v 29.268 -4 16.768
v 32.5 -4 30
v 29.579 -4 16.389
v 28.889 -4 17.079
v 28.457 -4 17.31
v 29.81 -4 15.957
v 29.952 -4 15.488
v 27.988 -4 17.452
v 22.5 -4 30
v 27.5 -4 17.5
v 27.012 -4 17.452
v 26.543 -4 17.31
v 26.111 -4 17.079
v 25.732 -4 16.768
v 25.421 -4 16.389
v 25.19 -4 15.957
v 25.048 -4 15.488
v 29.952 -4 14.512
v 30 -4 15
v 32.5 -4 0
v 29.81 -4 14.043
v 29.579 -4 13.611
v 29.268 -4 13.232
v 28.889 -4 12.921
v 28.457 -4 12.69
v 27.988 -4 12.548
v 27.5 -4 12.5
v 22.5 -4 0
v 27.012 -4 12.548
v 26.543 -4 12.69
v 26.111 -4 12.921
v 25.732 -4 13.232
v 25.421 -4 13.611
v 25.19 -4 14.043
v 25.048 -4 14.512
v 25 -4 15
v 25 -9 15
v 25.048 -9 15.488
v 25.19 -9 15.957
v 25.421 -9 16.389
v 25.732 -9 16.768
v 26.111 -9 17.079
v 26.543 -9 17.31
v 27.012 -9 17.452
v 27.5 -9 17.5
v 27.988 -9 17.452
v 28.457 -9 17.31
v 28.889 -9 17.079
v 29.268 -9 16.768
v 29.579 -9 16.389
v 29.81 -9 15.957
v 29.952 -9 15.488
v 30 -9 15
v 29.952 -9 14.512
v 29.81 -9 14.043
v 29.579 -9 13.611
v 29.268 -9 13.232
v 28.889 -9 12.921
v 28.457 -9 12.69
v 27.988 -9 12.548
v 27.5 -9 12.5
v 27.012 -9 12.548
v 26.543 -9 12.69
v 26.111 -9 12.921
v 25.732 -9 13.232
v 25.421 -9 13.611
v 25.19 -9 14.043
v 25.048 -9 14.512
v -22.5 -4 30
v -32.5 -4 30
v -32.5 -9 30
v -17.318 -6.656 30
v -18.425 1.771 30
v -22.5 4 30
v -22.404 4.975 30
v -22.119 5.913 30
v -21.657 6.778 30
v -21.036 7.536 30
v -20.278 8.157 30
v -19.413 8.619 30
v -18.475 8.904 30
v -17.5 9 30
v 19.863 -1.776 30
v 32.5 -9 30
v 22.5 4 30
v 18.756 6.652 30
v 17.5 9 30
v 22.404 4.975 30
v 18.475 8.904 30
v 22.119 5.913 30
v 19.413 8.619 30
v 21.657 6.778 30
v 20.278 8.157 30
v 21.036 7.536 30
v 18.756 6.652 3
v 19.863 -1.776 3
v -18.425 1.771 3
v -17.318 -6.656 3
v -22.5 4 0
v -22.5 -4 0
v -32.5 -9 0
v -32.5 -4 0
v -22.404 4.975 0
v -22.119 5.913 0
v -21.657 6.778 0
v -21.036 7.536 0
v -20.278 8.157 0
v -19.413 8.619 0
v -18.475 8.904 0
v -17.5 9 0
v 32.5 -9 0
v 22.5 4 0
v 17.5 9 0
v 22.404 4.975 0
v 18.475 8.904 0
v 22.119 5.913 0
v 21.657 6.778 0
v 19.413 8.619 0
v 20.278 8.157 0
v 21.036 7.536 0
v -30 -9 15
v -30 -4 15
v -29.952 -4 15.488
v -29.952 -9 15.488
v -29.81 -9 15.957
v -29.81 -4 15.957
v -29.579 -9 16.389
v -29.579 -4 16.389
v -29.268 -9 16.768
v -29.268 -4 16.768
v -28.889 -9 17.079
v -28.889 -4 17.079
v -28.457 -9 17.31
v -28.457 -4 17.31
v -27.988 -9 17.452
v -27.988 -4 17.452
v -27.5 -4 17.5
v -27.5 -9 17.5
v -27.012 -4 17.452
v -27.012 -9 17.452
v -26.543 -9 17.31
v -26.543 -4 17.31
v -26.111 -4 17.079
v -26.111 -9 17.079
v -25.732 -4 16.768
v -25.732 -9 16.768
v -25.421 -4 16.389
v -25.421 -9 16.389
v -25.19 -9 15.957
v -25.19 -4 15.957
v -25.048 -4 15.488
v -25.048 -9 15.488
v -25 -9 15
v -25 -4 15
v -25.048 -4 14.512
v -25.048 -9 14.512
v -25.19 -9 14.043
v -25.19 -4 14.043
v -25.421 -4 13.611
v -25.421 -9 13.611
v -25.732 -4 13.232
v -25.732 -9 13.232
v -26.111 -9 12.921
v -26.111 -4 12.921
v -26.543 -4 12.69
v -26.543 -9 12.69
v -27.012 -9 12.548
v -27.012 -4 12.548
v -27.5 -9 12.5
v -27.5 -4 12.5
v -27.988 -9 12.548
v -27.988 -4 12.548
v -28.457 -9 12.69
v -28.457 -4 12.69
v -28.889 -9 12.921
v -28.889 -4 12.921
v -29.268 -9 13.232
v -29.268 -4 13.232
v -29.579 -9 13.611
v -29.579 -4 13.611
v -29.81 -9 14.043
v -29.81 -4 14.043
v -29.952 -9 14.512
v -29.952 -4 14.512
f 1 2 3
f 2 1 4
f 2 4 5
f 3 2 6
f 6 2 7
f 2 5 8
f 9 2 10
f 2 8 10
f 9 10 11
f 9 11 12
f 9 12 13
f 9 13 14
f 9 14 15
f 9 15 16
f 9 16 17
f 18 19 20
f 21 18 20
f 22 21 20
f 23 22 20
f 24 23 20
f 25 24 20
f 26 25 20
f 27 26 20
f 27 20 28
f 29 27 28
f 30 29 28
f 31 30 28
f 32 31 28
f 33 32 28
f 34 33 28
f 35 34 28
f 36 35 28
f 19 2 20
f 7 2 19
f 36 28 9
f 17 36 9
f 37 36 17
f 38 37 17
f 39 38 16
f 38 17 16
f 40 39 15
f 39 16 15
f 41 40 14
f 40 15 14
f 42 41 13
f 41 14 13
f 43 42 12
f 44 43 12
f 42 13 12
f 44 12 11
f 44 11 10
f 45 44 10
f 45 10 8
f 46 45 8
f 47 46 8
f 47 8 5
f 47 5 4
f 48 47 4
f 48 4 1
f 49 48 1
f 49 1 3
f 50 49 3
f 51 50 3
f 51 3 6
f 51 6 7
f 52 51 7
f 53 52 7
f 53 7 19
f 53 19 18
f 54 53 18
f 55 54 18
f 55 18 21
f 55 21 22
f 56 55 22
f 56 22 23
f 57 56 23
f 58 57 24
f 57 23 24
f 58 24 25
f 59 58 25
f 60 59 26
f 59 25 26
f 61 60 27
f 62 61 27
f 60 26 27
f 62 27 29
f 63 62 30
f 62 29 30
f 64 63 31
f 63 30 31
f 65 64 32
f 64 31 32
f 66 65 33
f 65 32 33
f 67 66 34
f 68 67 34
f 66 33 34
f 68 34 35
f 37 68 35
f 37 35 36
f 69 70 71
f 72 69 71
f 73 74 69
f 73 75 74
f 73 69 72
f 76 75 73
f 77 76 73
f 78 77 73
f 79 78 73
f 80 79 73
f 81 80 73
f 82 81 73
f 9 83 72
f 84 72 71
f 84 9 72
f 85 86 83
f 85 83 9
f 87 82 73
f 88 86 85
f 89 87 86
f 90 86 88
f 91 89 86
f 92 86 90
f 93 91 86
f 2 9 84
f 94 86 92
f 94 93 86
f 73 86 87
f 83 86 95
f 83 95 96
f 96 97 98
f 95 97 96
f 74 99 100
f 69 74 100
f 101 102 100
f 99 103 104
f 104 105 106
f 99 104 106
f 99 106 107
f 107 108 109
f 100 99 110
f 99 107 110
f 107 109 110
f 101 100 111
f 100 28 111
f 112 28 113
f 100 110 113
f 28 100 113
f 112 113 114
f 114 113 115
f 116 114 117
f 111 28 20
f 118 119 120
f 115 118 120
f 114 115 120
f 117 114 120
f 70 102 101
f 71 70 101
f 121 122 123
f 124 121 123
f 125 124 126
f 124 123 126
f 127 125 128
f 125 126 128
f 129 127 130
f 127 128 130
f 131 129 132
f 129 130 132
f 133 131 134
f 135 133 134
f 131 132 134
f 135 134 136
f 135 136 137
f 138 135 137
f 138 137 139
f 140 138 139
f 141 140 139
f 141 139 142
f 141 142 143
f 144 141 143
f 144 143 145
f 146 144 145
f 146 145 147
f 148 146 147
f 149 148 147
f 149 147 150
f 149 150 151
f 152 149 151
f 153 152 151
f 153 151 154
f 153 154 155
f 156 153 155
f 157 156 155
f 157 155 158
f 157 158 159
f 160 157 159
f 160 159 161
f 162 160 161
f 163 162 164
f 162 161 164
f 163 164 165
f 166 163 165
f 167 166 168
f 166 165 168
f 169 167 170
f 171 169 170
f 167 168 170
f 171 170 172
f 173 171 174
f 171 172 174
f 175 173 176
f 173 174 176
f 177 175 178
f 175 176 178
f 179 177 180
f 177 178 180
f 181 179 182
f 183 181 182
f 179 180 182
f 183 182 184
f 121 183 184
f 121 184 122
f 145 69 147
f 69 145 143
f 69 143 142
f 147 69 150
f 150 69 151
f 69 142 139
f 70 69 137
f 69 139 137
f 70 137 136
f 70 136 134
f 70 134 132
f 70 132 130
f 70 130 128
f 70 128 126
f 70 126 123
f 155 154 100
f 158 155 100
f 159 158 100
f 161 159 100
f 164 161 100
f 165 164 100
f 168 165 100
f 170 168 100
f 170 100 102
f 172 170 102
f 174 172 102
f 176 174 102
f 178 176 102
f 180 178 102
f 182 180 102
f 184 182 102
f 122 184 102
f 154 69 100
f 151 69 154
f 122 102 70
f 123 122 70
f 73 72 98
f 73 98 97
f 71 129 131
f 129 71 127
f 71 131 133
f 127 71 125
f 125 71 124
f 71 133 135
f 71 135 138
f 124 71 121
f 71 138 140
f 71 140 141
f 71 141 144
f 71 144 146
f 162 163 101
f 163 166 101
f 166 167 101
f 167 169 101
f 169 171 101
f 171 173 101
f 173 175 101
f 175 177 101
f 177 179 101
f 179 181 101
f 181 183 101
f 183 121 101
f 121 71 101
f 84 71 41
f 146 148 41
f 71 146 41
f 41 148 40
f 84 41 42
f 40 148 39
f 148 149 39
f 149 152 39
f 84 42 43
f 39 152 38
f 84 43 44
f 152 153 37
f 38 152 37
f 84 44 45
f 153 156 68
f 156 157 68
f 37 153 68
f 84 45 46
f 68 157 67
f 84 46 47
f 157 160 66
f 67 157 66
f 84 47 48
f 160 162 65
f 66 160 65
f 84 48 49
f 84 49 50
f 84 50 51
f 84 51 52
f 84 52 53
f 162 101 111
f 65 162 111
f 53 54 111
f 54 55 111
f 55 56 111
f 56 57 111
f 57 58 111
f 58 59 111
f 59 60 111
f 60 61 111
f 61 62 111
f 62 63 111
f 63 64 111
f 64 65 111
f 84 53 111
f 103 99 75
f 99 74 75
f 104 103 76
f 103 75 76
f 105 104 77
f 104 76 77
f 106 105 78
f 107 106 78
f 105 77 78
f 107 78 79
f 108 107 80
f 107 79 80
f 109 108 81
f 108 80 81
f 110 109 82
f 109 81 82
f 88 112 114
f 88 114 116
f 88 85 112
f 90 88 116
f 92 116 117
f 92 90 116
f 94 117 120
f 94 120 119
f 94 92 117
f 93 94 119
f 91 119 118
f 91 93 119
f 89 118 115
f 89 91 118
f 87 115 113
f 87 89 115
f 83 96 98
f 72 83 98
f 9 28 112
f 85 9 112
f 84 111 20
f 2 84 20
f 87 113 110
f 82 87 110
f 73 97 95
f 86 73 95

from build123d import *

# Parameters (mm, degrees)
F1_DEPTH = 30
F2_DEPTH = 3
F3_R     = 5
F5_R     = 2.5
F4_R     = 2.5
F6_DEPTH = 25


with BuildPart() as f1:
    # F0 (on Top) → F1 (new body)
    with BuildSketch(Plane.XY):
        Polygon((-32.5, -9), (32.5, -9), (32.5, -4), (22.5, -4), (22.5, 9), (-22.5, 9), (-22.5, -4), (-32.5, -4), align=None)
        Polygon((18.7564, 6.652187), (19.862741, -1.775506), (-17.318257, -6.656426), (-18.424599, 1.771267), align=None, mode=Mode.SUBTRACT)
    extrude(amount=F1_DEPTH)

    # F0 (on Top) → F2 (join)
    with BuildSketch(Plane.XY):
        Polygon((-17.318257, -6.656426), (19.862741, -1.775506), (18.7564, 6.652187), (-18.424599, 1.771267), align=None)
    extrude(amount=F2_DEPTH)

    # F3
    f3_edges = [f1.edges().sort_by_distance(p)[0] for p in [
        (22.5, 9, 15),
        (-22.5, 9, 15),
    ]]
    fillet(f3_edges, radius=F3_R)

    # F5 (on face) + F4 (on face) → F6 (cut)
    with BuildSketch(Plane(origin=(0, -4, 0), x_dir=(-1, 0, 0), z_dir=(0, 1, 0))):
        with Locations((27.5, 15)):
            Circle(F5_R)
    with BuildSketch(Plane(origin=(0, -4, 0), x_dir=(-1, 0, 0), z_dir=(0, 1, 0))):
        with Locations((-27.5, 15)):
            Circle(F4_R)
    extrude(amount=-F6_DEPTH, mode=Mode.SUBTRACT)


solid = f1.part
